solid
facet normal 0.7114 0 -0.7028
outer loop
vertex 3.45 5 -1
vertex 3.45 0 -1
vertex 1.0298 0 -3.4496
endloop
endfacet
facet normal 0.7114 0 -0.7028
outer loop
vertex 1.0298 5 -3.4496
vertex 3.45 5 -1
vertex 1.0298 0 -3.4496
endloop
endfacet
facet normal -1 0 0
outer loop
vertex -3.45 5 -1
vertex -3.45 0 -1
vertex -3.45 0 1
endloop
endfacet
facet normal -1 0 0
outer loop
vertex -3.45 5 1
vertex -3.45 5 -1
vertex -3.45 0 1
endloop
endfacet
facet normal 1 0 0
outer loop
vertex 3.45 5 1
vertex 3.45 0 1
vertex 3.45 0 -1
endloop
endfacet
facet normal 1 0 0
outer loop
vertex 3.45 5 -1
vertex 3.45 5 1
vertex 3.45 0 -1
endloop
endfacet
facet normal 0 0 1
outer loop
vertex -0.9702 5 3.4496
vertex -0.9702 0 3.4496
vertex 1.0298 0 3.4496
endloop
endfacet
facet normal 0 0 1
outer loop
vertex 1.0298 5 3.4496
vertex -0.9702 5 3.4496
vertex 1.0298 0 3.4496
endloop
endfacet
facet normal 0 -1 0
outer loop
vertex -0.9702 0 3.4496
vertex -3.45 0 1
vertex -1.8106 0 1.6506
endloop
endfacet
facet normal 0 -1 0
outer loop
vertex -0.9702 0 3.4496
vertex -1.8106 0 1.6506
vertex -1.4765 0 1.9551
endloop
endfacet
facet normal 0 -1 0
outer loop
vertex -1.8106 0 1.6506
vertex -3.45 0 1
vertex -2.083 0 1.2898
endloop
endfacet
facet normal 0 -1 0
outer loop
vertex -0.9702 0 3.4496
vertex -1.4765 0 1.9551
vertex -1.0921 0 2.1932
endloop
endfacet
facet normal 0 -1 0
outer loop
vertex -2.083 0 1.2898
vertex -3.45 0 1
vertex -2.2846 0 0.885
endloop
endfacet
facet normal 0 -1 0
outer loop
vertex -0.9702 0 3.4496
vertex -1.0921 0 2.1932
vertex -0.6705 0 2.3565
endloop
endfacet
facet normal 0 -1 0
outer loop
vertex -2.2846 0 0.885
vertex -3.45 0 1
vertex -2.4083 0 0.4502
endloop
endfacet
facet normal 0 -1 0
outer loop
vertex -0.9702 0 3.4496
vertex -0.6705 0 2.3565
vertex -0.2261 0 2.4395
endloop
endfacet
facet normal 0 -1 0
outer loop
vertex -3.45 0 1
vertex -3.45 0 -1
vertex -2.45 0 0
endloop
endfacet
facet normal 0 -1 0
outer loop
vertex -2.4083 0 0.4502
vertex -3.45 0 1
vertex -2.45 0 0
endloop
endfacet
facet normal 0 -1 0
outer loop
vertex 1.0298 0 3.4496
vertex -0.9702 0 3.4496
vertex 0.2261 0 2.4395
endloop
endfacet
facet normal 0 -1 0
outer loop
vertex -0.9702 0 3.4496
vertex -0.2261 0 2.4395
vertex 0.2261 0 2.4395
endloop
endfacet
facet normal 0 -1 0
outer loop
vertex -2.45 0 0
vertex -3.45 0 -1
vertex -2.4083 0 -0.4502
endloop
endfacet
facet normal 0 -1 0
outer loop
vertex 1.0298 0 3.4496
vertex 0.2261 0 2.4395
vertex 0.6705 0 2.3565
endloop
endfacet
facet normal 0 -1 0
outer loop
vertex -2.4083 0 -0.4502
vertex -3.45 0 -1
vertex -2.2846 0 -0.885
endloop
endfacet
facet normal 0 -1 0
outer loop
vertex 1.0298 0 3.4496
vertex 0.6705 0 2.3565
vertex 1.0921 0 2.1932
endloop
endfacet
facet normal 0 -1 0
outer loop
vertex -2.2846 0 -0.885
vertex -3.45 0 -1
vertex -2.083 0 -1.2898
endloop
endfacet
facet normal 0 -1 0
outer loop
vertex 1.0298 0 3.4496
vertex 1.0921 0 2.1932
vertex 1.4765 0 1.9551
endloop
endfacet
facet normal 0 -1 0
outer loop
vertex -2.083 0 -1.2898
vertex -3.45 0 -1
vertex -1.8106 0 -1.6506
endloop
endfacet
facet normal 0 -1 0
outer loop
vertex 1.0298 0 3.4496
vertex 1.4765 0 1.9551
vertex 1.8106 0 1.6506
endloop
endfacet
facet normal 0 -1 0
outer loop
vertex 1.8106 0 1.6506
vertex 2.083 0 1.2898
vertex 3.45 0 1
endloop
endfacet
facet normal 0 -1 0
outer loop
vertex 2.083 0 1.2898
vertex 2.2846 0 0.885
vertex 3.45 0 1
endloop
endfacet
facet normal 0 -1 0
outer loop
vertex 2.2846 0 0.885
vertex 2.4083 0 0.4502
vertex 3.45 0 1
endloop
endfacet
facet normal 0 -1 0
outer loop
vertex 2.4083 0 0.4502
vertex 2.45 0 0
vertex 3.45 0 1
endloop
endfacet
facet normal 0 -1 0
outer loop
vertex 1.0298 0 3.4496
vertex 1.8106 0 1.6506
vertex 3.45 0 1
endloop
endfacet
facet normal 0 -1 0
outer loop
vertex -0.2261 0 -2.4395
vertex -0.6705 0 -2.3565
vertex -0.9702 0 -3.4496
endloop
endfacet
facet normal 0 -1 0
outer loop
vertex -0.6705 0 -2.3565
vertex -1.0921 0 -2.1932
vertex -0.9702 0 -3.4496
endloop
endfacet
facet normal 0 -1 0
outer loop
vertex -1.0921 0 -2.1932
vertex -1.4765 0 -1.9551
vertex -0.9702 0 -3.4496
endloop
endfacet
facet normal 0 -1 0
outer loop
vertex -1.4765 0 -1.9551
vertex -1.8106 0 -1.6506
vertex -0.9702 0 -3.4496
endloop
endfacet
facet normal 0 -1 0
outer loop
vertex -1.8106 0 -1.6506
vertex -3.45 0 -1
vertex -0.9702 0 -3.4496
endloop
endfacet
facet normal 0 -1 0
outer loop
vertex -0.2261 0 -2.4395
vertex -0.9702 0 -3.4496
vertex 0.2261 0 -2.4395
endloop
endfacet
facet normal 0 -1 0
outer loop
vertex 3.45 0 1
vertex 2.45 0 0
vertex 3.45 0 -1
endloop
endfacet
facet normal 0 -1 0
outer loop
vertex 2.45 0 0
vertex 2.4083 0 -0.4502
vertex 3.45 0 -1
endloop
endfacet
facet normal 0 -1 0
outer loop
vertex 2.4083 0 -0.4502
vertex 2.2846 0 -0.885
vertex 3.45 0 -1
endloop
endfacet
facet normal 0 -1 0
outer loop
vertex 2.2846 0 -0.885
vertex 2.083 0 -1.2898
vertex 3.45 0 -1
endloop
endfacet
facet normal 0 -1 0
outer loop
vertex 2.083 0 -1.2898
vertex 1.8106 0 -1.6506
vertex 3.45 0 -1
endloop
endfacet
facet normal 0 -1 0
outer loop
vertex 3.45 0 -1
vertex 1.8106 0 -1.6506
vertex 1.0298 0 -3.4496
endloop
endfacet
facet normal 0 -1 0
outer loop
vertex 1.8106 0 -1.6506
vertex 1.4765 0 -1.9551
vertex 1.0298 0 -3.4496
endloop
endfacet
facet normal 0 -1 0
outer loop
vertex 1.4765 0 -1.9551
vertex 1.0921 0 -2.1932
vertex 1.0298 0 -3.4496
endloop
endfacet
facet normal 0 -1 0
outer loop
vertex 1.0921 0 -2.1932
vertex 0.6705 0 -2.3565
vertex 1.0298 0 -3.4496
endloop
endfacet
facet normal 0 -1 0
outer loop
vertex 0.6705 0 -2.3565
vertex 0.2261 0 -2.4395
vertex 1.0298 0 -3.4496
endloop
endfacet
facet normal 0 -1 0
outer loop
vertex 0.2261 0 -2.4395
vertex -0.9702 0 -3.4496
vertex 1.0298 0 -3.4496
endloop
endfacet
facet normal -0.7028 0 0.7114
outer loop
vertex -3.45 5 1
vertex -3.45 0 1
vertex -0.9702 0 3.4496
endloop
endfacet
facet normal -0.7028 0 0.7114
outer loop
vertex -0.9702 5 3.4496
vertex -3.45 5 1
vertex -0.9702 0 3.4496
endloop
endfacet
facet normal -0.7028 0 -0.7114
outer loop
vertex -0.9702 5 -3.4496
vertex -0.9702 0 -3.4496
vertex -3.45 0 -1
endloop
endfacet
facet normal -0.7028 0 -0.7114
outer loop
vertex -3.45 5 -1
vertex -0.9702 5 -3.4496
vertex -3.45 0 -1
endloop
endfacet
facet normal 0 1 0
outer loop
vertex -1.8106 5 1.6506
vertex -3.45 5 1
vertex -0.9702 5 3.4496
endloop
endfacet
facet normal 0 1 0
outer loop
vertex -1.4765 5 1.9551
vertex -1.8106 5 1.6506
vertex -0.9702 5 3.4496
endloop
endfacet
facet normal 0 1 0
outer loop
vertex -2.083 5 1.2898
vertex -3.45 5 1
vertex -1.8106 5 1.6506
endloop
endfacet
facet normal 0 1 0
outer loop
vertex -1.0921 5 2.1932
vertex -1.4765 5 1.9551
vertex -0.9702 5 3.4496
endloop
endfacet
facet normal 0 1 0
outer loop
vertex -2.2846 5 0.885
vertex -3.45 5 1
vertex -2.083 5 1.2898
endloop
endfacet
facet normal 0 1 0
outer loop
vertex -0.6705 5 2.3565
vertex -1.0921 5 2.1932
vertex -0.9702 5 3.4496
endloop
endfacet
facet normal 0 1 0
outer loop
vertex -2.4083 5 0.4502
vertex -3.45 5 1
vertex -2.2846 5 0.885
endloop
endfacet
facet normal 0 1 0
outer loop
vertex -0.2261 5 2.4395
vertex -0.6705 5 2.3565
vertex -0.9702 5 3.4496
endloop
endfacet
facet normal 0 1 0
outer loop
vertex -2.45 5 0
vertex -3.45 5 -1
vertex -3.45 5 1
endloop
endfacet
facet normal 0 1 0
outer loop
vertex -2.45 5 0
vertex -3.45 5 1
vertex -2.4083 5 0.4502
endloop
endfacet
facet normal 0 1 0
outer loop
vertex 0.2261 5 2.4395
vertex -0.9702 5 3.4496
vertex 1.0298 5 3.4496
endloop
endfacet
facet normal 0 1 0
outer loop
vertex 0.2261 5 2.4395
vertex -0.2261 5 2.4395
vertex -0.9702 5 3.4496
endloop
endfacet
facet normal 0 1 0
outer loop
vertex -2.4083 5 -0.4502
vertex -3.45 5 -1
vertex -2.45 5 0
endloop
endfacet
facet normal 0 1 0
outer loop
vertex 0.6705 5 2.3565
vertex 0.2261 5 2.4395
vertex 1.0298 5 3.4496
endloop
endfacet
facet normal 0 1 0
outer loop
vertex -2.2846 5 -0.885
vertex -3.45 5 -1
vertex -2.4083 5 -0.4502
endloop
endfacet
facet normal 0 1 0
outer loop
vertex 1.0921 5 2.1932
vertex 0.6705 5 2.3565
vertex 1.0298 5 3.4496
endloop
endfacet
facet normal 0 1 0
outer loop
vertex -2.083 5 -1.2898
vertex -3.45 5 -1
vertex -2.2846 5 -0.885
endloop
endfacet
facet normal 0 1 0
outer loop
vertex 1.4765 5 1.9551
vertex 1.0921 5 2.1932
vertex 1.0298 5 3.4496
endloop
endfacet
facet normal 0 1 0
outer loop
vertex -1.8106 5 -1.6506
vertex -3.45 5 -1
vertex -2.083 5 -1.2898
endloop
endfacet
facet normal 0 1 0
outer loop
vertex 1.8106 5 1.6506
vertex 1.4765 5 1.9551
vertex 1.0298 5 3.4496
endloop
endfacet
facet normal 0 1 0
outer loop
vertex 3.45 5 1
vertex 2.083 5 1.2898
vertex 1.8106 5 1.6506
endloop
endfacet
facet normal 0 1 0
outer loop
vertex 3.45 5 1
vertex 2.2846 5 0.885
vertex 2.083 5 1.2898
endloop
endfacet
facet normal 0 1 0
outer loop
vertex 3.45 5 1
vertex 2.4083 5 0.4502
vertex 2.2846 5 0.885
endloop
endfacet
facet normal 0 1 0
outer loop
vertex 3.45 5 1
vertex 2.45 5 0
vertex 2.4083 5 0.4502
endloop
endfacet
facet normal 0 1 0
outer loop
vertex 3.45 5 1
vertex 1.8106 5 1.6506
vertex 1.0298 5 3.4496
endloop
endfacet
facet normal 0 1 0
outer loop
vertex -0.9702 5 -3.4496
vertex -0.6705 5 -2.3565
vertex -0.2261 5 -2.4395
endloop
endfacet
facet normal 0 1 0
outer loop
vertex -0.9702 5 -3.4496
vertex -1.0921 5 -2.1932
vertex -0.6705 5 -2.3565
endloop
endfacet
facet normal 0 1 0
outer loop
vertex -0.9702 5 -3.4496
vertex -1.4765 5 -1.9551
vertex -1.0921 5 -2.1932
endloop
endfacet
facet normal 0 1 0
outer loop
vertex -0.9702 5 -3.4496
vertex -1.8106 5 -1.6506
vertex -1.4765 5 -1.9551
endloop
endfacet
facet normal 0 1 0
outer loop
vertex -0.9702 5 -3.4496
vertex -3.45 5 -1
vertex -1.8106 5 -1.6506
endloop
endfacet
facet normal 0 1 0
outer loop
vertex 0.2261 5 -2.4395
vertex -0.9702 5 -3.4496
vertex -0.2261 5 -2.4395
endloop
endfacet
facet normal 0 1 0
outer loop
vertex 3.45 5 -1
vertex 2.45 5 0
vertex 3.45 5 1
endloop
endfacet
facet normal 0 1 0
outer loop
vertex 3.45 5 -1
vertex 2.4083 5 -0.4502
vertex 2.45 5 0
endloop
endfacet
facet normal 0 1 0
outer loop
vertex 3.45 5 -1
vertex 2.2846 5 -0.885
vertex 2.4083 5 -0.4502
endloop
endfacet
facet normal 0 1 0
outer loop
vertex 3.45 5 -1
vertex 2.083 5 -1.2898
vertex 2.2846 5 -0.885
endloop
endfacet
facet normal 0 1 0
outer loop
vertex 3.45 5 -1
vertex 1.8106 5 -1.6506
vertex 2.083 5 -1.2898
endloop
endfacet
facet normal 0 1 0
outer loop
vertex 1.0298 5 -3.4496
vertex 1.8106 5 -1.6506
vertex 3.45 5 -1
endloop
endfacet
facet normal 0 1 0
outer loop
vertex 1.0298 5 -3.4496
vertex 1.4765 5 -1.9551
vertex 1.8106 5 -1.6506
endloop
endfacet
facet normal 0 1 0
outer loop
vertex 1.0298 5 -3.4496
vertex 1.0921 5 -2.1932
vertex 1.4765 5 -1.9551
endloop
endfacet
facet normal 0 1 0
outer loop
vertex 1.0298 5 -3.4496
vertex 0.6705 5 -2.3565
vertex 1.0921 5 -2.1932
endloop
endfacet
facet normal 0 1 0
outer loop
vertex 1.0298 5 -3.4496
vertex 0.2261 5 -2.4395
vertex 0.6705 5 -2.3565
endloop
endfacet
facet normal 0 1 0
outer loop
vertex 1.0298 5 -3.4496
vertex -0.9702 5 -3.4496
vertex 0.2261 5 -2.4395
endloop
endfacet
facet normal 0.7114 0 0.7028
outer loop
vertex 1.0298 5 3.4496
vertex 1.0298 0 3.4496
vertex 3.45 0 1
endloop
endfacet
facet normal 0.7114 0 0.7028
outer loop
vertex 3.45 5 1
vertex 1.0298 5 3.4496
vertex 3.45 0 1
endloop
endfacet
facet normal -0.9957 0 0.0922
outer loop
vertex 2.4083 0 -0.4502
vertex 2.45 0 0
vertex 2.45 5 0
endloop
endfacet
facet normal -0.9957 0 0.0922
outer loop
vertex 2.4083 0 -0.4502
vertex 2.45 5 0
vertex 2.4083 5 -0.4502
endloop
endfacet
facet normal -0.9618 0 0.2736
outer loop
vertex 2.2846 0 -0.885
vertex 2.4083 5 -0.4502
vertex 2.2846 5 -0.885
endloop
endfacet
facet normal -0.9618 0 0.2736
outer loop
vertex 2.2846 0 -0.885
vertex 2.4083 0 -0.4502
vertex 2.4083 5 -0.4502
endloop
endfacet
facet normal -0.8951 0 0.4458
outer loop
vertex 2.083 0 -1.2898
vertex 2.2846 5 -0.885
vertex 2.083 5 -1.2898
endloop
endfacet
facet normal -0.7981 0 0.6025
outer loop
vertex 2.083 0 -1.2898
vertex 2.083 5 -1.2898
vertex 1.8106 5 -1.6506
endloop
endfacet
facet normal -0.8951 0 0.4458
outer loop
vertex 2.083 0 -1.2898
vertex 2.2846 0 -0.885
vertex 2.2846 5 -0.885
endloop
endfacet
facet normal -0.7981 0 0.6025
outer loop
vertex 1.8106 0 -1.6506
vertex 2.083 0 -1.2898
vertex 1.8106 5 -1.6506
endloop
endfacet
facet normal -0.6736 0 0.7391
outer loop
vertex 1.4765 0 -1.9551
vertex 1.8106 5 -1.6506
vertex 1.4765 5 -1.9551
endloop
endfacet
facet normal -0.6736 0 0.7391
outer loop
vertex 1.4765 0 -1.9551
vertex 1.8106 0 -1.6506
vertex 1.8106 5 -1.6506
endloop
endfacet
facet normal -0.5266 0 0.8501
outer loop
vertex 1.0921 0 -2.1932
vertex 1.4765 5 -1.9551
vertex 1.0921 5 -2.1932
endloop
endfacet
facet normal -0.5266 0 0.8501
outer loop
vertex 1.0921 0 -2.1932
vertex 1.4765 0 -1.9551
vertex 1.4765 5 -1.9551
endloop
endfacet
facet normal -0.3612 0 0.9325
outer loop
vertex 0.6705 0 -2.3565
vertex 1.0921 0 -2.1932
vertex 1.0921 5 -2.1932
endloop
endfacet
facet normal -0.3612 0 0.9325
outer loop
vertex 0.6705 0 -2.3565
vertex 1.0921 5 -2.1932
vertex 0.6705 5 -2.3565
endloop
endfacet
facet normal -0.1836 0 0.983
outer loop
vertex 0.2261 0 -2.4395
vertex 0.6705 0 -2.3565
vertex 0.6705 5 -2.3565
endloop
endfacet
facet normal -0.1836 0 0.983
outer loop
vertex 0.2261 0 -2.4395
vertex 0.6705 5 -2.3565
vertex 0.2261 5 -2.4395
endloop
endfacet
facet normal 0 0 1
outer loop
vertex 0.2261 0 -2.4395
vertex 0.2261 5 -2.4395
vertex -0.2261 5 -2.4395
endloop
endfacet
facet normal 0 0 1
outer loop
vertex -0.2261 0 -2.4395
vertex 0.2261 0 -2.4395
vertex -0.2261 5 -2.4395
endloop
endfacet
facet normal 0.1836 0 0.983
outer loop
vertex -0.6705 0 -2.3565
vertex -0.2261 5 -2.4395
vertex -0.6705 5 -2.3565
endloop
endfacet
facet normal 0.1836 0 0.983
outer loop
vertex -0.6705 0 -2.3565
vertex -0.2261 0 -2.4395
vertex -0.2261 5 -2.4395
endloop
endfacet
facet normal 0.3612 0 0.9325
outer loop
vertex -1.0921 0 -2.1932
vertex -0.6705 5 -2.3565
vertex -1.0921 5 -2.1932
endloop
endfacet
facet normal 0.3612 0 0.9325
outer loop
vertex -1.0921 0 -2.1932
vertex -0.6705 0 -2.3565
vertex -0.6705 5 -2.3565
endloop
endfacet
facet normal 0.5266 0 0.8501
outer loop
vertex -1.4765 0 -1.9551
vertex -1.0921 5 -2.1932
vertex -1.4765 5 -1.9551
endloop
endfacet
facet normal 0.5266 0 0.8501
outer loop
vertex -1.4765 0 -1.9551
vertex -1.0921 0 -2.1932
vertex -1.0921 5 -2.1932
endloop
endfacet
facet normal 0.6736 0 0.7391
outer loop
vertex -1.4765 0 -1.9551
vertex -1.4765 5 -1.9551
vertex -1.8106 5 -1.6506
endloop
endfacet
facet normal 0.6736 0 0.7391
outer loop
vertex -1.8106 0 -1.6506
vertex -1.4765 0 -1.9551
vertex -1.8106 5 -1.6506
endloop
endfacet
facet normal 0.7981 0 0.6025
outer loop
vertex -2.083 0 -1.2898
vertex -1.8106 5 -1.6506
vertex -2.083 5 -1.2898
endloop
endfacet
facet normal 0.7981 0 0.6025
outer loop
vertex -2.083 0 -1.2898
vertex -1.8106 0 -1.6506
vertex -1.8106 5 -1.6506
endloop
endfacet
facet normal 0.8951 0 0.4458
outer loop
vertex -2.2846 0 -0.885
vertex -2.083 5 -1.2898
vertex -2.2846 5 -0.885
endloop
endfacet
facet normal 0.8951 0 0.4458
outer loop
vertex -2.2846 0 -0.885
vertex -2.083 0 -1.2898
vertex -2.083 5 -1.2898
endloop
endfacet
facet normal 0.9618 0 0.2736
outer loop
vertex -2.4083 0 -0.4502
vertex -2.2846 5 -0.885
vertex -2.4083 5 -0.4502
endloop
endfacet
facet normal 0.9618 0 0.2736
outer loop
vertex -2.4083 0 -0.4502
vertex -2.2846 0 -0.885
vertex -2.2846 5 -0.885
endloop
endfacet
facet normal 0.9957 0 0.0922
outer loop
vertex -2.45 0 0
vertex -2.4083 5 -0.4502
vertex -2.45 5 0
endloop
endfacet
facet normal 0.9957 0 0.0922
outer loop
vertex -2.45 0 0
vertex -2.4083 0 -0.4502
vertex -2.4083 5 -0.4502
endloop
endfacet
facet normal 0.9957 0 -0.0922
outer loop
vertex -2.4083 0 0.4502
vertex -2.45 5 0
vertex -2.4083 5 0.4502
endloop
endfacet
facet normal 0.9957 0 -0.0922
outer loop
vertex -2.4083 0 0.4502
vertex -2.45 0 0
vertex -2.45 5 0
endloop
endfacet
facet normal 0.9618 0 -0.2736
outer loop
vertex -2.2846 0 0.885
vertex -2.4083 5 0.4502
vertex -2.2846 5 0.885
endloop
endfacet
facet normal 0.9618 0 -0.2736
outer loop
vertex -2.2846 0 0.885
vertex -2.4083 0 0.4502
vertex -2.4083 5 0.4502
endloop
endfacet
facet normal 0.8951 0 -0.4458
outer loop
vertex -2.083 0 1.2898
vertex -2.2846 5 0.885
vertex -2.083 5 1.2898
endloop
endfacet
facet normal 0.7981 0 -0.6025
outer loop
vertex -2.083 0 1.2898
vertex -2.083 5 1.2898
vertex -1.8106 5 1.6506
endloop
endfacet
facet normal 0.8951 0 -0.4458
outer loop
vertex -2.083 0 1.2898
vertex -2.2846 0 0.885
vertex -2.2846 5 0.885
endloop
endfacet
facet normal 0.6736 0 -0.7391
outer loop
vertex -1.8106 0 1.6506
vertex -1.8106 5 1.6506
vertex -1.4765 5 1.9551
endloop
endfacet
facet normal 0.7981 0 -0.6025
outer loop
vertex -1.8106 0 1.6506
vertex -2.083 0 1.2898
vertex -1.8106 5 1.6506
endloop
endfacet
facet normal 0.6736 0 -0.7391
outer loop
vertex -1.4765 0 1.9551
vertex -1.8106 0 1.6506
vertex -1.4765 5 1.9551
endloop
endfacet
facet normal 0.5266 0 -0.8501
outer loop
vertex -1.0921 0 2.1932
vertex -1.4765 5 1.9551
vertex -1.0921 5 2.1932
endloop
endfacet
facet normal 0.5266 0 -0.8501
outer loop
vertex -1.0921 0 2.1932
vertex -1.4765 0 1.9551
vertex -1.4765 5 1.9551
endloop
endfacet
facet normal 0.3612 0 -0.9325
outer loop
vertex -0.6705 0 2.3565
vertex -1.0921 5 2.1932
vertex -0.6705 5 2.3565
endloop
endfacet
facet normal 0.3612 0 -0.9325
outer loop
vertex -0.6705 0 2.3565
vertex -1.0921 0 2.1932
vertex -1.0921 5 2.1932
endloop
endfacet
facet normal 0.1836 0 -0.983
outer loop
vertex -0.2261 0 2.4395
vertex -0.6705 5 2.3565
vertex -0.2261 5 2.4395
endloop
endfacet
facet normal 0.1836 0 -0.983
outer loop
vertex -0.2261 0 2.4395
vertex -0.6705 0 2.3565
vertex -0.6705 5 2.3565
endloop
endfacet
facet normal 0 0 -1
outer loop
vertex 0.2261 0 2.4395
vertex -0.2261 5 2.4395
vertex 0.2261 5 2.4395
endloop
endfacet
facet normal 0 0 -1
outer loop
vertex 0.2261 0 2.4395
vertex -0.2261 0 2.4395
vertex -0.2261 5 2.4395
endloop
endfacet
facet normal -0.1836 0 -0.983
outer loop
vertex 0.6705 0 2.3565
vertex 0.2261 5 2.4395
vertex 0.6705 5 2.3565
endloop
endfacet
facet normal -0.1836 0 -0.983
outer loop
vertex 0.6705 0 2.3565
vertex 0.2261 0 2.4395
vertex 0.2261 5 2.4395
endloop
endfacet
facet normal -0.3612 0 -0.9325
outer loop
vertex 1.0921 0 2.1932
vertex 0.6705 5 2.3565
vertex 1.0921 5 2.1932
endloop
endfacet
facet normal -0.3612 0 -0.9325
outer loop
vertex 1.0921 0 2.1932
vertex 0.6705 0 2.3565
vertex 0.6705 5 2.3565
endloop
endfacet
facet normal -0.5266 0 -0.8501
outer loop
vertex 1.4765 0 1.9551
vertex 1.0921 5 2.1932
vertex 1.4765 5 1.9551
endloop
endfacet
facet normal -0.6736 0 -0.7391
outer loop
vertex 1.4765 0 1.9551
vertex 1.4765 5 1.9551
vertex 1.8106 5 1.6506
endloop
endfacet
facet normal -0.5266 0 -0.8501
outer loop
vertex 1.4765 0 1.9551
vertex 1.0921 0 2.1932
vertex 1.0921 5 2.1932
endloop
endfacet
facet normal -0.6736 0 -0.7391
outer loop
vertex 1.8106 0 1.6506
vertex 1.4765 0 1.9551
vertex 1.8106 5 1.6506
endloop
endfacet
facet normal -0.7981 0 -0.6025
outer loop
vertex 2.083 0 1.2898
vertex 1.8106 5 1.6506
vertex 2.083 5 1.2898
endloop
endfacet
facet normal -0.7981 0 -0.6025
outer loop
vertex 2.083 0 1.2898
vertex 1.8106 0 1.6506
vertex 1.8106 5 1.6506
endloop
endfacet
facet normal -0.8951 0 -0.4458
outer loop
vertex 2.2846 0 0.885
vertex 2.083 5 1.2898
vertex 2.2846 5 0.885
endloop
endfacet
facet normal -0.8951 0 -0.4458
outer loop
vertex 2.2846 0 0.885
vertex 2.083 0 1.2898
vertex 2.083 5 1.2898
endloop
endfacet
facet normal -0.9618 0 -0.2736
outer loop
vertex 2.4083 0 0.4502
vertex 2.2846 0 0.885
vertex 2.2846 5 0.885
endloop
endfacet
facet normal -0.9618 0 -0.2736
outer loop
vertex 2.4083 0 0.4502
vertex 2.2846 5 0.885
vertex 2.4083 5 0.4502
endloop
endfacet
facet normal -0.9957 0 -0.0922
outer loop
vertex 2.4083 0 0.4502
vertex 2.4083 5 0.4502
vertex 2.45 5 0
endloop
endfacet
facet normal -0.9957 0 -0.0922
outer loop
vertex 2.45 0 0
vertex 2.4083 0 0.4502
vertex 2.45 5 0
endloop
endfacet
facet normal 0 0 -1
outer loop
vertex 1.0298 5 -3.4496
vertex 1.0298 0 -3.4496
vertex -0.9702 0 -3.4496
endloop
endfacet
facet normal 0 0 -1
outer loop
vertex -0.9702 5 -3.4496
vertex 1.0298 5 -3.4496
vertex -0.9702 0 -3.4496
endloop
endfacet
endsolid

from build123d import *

# Parameters (mm, degrees)
CROQUIS1_R              = 2.45
SALIENTE_EXTRUIR1_DEPTH = 5


with BuildPart() as part:
    # Croquis1 → Saliente-Extruir1 (new body)
    with BuildSketch(Plane(origin=(0, 0, 0), x_dir=(1, 0, 0), z_dir=(0, 1, 0))):
        Polygon((0.029803377, 3.449555781), (-0.970196623, 3.449555781), (-3.45, 1), (-3.45, -1), (-0.970196623, -3.449555781), (0.029803377, -3.449555781), (1.029803377, -3.449555781), (3.45, -1), (3.45, 1), (1.029803377, 3.449555781), align=None)
        Circle(CROQUIS1_R, mode=Mode.SUBTRACT)
    extrude(amount=SALIENTE_EXTRUIR1_DEPTH)


solid = part.part
